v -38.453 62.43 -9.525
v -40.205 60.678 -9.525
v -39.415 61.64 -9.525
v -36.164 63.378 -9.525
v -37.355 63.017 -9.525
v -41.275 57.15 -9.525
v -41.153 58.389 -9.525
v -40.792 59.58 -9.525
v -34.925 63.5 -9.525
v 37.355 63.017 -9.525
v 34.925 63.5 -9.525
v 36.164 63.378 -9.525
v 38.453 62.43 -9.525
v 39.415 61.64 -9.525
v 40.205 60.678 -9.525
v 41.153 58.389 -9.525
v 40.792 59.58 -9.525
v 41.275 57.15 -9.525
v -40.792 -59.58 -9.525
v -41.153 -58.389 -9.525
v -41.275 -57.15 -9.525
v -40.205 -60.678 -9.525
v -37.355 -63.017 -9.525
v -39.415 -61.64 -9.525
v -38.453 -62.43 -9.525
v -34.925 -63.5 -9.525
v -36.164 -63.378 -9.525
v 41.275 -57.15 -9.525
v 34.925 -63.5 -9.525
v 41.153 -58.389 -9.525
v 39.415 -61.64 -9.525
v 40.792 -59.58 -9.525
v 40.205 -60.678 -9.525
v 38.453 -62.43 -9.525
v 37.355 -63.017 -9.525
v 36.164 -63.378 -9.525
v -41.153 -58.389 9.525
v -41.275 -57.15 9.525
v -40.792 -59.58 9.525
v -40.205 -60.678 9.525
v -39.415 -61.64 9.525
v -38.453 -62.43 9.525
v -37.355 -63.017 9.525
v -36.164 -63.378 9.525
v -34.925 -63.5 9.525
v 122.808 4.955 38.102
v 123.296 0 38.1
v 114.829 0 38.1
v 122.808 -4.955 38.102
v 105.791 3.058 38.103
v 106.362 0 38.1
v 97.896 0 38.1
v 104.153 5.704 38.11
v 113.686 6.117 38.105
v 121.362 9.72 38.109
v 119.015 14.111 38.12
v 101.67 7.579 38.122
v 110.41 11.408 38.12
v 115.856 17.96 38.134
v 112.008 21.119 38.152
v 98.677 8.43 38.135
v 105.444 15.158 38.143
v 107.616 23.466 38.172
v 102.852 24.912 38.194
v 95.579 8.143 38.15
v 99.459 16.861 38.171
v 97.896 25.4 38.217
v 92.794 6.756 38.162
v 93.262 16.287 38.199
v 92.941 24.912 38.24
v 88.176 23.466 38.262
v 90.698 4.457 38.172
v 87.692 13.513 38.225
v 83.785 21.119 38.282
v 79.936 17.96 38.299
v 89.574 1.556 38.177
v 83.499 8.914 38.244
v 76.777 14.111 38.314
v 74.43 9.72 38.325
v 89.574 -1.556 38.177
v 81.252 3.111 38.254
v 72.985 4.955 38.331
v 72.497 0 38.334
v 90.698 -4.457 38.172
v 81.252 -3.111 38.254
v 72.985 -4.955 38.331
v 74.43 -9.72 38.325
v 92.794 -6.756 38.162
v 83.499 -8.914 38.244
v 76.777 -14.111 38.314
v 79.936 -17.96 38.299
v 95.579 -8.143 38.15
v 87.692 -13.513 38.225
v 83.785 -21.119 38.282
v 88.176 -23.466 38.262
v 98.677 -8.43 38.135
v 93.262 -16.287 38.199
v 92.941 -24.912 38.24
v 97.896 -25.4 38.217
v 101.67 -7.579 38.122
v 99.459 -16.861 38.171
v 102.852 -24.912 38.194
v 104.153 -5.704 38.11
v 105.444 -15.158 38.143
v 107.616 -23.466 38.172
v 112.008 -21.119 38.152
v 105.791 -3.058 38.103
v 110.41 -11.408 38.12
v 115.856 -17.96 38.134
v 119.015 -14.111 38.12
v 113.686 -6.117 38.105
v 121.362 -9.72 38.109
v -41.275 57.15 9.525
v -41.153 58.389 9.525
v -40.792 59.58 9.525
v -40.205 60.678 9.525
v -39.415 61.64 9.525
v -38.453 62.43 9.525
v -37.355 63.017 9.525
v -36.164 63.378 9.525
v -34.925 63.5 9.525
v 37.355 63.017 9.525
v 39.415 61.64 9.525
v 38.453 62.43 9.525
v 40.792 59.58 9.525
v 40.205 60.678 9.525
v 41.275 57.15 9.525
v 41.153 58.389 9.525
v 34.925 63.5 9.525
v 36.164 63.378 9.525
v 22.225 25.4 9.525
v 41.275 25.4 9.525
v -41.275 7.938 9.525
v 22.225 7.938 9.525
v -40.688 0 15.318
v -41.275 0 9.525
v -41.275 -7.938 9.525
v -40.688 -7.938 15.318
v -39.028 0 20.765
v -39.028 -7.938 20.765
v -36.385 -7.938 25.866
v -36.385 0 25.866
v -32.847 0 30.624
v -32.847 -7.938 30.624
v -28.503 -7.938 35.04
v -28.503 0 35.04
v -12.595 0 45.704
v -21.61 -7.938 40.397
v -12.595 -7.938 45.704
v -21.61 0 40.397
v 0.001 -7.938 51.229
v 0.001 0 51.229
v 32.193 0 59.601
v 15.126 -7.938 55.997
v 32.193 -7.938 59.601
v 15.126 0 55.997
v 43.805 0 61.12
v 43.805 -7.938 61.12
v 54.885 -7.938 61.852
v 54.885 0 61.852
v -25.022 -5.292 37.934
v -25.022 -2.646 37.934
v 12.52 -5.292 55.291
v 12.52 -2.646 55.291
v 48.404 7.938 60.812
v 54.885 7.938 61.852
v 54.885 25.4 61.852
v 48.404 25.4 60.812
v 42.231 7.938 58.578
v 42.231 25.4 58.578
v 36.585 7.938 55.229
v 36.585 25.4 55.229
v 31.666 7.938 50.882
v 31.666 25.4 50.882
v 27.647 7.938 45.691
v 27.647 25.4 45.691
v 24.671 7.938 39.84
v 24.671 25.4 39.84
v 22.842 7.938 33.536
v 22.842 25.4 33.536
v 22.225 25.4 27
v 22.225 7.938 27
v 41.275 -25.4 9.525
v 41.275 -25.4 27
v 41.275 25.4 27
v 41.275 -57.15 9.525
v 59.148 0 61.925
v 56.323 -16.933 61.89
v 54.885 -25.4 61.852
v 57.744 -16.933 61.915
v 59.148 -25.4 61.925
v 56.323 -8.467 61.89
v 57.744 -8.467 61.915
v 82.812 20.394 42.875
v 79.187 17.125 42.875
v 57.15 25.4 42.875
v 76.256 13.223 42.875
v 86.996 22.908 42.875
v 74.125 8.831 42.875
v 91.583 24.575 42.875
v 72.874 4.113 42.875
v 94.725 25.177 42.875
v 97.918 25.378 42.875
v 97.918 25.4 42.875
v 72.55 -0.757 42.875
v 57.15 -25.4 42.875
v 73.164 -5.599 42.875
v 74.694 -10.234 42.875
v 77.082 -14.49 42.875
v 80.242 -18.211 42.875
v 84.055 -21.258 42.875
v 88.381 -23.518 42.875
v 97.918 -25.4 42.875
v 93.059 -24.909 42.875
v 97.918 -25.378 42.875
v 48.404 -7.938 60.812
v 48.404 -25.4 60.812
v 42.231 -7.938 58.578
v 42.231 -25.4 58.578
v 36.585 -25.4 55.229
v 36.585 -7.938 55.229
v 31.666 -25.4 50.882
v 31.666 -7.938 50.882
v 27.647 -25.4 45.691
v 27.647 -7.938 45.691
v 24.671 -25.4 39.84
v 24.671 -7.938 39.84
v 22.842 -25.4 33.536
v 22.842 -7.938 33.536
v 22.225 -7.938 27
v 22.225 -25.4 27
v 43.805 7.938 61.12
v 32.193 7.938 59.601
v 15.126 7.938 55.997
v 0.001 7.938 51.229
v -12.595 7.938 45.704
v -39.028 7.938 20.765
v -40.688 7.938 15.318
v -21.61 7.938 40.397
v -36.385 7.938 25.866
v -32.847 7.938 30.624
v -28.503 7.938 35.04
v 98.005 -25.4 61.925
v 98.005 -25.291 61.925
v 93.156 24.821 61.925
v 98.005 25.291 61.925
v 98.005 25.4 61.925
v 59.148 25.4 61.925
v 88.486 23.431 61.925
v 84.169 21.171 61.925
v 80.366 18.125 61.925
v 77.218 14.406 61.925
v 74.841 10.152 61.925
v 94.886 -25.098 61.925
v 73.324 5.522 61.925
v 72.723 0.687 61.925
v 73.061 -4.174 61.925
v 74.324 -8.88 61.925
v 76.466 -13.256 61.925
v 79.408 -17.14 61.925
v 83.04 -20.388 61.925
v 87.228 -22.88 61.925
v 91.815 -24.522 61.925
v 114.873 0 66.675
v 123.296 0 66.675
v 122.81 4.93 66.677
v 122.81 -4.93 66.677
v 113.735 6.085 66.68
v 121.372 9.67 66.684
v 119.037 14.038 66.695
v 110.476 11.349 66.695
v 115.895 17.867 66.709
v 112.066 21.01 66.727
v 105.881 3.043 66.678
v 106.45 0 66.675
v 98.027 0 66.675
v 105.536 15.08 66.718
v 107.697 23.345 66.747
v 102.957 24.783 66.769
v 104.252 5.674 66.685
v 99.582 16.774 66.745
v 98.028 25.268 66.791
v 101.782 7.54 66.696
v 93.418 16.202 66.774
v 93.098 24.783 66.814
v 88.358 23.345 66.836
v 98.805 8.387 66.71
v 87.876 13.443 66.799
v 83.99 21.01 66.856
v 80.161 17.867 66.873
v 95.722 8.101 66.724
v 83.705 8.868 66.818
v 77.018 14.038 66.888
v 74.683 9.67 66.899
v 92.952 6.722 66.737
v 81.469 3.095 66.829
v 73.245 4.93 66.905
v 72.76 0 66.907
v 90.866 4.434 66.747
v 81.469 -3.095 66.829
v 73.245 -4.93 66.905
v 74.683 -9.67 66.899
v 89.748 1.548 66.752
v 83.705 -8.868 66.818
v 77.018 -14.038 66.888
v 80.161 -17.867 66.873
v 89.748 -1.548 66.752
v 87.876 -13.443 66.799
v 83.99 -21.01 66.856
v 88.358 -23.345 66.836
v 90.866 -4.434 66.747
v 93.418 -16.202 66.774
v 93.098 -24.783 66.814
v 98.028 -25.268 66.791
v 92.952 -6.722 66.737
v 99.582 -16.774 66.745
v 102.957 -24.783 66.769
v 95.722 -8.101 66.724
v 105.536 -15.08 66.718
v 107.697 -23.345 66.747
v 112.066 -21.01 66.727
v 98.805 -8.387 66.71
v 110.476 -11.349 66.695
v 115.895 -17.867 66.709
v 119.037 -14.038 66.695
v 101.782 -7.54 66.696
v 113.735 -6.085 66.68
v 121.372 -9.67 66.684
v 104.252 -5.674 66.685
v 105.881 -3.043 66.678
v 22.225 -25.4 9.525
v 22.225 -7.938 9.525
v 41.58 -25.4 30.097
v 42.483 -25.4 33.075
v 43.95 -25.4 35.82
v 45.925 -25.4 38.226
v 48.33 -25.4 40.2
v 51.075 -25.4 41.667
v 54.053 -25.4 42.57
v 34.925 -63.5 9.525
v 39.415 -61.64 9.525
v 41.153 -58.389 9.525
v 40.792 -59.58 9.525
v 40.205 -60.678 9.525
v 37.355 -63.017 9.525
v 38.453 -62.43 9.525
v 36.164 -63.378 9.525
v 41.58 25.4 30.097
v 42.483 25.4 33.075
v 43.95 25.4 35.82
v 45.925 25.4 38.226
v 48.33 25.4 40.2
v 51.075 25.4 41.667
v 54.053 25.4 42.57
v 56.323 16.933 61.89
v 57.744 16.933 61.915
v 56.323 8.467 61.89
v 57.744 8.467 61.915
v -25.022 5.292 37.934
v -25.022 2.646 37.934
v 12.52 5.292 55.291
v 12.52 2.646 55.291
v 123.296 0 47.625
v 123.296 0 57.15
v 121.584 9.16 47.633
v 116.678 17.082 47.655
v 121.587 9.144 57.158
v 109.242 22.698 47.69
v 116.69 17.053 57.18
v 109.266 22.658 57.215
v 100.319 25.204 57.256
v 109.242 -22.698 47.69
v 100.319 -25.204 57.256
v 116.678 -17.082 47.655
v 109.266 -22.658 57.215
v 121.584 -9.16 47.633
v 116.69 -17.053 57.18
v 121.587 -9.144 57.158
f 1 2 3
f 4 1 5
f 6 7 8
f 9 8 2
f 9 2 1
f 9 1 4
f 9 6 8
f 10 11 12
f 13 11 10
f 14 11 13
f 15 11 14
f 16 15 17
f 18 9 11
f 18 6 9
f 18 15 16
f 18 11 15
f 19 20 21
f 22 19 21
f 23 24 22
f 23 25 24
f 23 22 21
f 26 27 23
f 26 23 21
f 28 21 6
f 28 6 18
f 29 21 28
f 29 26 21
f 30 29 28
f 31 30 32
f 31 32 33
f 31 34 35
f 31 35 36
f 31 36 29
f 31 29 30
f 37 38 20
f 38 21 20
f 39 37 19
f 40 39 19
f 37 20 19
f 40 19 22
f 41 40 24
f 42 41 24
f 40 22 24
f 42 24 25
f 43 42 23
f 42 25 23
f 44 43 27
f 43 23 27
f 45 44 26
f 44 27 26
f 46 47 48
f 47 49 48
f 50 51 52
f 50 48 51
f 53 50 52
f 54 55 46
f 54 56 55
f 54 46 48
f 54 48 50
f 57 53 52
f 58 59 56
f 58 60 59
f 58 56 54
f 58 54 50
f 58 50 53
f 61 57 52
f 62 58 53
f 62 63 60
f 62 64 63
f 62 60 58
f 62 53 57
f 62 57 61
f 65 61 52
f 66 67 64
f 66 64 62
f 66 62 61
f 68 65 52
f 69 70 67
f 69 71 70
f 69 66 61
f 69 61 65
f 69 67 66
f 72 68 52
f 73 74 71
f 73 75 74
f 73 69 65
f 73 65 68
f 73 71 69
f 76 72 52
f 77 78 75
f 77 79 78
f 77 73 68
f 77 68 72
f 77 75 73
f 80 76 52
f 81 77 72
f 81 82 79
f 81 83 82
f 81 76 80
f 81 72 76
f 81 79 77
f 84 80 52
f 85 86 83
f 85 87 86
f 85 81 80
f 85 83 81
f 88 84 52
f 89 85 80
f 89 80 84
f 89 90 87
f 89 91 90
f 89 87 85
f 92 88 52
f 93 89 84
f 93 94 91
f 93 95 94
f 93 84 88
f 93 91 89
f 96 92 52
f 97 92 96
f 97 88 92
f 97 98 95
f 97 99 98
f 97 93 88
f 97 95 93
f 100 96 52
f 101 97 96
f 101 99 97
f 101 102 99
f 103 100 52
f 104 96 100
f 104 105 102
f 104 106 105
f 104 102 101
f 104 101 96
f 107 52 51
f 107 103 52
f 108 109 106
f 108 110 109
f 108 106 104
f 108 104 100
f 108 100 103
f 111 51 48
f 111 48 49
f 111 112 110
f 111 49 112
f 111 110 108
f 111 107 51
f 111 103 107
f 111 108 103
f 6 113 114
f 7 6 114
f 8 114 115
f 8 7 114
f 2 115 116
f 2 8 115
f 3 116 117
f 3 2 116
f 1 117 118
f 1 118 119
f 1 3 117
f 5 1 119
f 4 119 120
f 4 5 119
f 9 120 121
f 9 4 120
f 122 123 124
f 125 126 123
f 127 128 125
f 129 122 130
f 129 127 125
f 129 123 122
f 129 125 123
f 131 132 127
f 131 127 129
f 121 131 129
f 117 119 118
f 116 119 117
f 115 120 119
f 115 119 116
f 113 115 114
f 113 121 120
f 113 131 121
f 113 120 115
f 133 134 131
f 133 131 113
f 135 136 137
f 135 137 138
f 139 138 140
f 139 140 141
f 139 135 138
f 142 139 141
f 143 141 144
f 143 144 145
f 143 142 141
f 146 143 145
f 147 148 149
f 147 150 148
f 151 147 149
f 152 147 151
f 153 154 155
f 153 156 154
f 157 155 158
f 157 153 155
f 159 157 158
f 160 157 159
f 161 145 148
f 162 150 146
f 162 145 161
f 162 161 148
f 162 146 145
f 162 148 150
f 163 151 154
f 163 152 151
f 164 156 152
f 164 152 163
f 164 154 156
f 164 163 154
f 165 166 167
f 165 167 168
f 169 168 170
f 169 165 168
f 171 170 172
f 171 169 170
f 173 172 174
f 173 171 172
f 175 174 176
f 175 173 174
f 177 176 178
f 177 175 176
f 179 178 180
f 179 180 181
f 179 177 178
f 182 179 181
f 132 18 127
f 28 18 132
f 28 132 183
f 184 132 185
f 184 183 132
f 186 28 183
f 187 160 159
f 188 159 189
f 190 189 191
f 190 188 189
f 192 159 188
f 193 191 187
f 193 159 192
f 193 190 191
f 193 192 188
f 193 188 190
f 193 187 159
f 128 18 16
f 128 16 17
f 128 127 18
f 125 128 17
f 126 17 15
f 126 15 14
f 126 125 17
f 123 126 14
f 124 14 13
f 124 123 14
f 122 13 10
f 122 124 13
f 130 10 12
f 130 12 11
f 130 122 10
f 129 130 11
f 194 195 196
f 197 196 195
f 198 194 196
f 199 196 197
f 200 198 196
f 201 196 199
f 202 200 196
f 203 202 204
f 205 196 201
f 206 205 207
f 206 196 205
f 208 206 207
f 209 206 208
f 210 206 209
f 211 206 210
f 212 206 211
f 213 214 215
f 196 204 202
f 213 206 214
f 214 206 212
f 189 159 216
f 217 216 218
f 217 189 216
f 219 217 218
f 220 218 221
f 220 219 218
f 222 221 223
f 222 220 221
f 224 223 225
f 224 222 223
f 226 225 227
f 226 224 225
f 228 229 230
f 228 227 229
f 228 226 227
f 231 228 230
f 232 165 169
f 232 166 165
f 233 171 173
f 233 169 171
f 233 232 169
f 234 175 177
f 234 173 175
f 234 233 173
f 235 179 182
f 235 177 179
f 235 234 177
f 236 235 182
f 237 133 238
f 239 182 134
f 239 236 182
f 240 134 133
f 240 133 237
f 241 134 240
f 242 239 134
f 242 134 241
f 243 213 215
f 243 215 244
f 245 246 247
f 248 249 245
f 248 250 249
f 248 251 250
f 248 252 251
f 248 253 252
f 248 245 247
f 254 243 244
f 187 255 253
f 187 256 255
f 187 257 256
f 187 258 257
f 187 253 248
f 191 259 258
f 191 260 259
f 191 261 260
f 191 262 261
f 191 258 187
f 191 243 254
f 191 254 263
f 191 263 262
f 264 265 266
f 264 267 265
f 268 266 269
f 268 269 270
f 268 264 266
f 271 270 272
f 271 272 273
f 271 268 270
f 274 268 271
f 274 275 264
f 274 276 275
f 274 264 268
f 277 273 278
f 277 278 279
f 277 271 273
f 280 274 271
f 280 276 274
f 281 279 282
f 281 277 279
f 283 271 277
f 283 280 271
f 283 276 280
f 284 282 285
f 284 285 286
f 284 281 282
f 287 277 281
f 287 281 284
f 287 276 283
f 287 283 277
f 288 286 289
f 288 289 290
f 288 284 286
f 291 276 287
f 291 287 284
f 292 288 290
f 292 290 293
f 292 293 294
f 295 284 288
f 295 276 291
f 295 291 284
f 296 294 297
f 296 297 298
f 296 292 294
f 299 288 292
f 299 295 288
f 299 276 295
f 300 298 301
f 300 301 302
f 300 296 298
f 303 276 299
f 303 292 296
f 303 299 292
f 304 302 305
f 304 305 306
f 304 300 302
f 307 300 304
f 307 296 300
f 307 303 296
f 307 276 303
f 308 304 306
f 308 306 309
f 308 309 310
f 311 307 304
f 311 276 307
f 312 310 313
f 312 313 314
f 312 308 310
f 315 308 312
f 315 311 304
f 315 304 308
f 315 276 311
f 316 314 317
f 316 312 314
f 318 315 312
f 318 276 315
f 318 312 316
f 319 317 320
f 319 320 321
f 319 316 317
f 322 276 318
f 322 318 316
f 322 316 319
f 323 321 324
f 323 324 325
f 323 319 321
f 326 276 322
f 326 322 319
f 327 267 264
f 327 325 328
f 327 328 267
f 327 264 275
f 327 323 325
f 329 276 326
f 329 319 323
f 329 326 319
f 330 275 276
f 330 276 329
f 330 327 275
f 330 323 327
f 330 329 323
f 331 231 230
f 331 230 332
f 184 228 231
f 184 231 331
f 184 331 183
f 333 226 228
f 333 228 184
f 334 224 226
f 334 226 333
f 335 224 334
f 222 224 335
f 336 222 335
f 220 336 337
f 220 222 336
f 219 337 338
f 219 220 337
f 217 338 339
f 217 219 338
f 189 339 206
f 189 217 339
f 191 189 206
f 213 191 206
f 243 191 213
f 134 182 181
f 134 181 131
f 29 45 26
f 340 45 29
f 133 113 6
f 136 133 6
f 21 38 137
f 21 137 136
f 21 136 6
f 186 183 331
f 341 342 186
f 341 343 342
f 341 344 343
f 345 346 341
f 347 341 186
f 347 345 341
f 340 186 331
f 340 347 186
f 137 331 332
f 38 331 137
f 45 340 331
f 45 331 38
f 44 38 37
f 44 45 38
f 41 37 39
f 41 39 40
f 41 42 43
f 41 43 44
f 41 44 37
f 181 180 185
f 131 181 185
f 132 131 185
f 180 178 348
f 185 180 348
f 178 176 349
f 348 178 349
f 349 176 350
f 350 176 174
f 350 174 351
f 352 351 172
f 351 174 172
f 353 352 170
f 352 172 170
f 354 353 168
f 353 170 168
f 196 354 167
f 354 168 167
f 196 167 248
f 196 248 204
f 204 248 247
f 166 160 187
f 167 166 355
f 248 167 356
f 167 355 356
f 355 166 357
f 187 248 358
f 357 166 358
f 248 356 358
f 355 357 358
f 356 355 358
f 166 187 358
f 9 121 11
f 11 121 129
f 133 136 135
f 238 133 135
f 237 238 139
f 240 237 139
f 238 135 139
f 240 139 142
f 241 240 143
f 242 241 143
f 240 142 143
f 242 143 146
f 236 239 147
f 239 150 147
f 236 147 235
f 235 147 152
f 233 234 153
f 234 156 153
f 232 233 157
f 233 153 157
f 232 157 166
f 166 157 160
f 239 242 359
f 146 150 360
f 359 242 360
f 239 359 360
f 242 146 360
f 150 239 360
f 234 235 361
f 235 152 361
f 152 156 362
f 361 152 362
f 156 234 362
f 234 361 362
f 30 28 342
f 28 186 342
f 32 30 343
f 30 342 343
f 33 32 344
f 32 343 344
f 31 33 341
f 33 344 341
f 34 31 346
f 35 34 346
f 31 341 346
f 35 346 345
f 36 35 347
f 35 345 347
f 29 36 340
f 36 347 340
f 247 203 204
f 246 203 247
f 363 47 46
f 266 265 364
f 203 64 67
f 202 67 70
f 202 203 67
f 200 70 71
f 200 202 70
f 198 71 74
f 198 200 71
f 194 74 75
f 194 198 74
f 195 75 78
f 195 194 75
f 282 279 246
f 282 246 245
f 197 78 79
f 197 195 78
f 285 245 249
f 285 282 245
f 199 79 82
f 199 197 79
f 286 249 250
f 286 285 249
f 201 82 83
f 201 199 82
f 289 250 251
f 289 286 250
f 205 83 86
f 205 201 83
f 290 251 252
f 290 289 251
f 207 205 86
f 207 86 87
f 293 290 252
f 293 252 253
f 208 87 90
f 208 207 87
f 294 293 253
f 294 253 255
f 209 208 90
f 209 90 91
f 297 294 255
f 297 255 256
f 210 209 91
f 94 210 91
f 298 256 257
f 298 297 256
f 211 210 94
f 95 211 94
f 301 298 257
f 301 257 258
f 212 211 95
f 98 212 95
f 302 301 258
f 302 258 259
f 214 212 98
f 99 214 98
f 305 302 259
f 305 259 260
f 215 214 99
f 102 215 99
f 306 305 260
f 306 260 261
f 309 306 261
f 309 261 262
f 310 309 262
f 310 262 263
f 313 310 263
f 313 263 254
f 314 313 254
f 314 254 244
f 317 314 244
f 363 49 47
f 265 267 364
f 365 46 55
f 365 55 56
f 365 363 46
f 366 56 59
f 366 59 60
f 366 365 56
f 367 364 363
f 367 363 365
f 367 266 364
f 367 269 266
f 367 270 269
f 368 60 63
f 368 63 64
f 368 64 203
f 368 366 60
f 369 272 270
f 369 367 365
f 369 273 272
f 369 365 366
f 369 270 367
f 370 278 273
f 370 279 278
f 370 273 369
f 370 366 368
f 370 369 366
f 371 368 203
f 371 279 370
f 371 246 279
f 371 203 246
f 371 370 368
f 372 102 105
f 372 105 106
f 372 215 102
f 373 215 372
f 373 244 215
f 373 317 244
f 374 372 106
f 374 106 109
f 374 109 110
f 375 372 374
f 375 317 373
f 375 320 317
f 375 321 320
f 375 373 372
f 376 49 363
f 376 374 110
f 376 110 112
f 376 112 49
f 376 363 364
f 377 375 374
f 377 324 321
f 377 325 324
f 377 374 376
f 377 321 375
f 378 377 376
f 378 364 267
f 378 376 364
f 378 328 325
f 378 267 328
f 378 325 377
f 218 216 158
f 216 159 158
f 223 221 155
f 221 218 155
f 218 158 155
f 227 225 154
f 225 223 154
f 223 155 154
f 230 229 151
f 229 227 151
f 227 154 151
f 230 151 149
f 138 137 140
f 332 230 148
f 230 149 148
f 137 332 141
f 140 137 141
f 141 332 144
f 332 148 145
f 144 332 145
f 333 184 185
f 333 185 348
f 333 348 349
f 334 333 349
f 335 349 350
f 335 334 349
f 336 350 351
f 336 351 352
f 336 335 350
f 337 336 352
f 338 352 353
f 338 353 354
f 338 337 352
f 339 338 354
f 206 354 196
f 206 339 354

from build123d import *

# Parameters (mm, degrees)
F1_DEPTH = 63.5
F2_DEPTH = 7.9375
F3_DEPTH = 25.4
F5_R     = 6.35


with BuildPart() as f1:
    # F0 (on Front) → F1 (new body, symmetric)
    with BuildSketch(Plane.XZ):
        Polygon((-41.275, 9.525), (-41.275, -9.525), (41.275, -9.525), (41.275, 9.525), (22.225, 9.525), align=None)
    extrude(amount=F1_DEPTH, both=True)

    # F0 (on Front) → F2 (join, symmetric)
    with BuildSketch(Plane.XZ):
        with BuildLine():
            add(Edge.make_bspline(
                [(-41.275, 9.525), (-41.15331158, 43.5455983009), (15.5951323603, 60.6045840668), (54.8853746059, 61.8517006395)],
                knots=[0, 0, 0, 0, 109.2519553894, 109.2519553894, 109.2519553894, 109.2519553894], degree=3))
            Line((-41.275, 9.525), (22.225, 9.525))
            Line((22.225, 9.525), (22.225, 27.0002))
            ThreePointArc((22.225, 27.0002), (31.666204493, 50.8818203712), (54.8853746059, 61.8517006395))
        make_face()
    extrude(amount=F2_DEPTH, both=True)

    # F0 (on Front) → F3 (join, symmetric)
    with BuildSketch(Plane.XZ):
        Polygon((98.005393815, 61.9252), (72.4958287168, 61.9252), (72.4958287168, 42.8752), (97.9177884222, 42.8752), align=None)
        with BuildLine():
            Line((22.225, 9.525), (41.275, 9.525))
            Line((41.275, 9.525), (41.275, 27.0002))
            ThreePointArc((41.275, 27.0002), (45.9246798487, 38.2255201513), (57.15, 42.8752))
            Line((57.15, 42.8752), (72.4958287168, 42.8752))
            Line((72.4958287168, 42.8752), (72.4958287168, 61.9252))
            Line((72.4958287168, 61.9252), (59.1482142662, 61.9252))
            add(Edge.make_bspline(
                [(54.8853746059, 61.8517006395), (56.3311922229, 61.8975925202), (57.7533693148, 61.92207321), (59.1482142662, 61.9252)],
                knots=[109.2519553894, 109.2519553894, 109.2519553894, 109.2519553894, 113.2722513399, 113.2722513399, 113.2722513399, 113.2722513399], degree=3))
            ThreePointArc((54.8853746059, 61.8517006395), (31.666204493, 50.8818203712), (22.225, 27.0002))
            Line((22.225, 27.0002), (22.225, 9.525))
        make_face()
    extrude(amount=F3_DEPTH, both=True)

    # F0 (on Front) → F4 (revolve)
    with BuildSketch(Plane.XZ):
        Polygon((98.0272367597, 66.675), (98.005393815, 61.9252), (97.9177884222, 42.8752), (97.8958287168, 38.100010092), (123.2958287168, 38.100010092), (123.2958287168, 66.675), align=None)
    revolve(axis=Axis((97.9615327382, 0, 52.387505046), (0.0045986597, 0, 0.9999894261)))

    # F5
    f5_edges = [f1.edges().sort_by_distance(p)[0] for p in [
        (-41.275, -63.5, 0),
        (41.275, -63.5, 0),
        (41.275, 63.5, 0),
        (-41.275, 63.5, 0),
    ]]
    fillet(f5_edges, radius=F5_R)


solid = f1.part
